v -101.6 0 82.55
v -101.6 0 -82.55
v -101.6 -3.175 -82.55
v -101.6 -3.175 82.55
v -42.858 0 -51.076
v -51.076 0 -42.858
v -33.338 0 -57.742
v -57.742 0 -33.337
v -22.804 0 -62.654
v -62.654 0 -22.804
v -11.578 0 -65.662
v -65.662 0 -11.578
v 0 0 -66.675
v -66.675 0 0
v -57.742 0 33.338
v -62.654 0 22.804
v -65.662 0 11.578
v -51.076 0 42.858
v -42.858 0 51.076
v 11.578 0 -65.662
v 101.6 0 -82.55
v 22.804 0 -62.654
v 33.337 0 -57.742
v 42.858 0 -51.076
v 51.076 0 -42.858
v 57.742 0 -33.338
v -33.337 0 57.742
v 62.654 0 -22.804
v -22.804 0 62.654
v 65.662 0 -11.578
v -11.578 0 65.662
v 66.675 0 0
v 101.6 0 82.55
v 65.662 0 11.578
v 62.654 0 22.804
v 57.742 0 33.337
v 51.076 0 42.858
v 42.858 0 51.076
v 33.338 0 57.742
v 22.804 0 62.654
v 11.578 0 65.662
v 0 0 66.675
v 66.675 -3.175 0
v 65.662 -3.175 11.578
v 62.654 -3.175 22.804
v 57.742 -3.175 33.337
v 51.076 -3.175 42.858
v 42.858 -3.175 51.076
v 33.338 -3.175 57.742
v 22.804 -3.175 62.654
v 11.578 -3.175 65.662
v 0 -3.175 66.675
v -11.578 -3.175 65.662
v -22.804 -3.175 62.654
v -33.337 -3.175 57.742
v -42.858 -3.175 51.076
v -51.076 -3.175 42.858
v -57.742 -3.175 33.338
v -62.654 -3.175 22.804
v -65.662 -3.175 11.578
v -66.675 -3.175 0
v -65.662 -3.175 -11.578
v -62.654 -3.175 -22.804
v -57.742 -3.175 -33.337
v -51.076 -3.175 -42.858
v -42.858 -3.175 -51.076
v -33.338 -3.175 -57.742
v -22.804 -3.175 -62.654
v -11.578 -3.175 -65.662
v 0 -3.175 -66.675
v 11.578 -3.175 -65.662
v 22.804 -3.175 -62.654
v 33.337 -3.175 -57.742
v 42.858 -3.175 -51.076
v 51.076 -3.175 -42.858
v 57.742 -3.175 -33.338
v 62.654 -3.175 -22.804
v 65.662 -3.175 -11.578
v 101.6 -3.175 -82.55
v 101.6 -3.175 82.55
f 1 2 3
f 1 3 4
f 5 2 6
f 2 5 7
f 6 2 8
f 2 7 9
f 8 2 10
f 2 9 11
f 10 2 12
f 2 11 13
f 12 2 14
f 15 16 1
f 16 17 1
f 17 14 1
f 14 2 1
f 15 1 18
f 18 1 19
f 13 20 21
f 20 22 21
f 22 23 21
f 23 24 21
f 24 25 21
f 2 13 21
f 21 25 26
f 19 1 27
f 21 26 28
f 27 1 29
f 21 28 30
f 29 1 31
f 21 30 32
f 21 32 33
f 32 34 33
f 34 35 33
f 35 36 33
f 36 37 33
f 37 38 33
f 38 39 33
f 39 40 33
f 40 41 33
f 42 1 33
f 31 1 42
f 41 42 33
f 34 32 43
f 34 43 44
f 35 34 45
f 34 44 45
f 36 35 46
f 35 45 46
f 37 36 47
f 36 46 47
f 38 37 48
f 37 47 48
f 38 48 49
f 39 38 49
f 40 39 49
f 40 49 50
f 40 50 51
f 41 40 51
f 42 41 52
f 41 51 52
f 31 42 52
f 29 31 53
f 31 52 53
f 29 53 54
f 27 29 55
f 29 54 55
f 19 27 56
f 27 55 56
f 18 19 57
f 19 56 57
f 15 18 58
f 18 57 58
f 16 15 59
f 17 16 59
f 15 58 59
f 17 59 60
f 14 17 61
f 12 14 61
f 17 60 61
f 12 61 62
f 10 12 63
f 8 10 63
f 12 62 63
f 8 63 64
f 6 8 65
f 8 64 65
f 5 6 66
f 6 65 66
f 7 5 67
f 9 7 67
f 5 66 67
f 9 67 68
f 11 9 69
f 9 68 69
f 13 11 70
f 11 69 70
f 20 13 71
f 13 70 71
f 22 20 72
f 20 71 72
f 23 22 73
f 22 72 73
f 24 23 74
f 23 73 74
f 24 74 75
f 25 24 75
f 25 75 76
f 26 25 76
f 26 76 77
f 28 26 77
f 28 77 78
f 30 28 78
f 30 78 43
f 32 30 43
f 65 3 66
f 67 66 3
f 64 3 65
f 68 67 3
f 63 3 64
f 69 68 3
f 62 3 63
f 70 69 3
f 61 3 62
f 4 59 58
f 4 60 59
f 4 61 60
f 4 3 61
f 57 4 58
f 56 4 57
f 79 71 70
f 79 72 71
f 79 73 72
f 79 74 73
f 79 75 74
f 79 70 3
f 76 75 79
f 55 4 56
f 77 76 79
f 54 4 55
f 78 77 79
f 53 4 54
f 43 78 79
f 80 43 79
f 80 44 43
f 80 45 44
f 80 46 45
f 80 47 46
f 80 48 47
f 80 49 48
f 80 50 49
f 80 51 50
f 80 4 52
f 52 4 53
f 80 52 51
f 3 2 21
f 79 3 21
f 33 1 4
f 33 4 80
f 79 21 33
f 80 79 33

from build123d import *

# Parameters (mm, degrees)
F0_W     = 203.2
F0_H     = 165.1
F1_DEPTH = 3.175
F2_R     = 66.675
F3_DEPTH = 12.7


with BuildPart() as f1:
    # F0 (on Front) → F1 (new body)
    with BuildSketch(Plane.XZ):
        Rectangle(F0_W, F0_H)
    extrude(amount=F1_DEPTH)

    # F2 (on face) → F3 (cut, symmetric)
    with BuildSketch(Plane.XZ.offset(3.175)):
        Circle(F2_R)
    extrude(amount=F3_DEPTH, both=True, mode=Mode.SUBTRACT)


solid = f1.part
